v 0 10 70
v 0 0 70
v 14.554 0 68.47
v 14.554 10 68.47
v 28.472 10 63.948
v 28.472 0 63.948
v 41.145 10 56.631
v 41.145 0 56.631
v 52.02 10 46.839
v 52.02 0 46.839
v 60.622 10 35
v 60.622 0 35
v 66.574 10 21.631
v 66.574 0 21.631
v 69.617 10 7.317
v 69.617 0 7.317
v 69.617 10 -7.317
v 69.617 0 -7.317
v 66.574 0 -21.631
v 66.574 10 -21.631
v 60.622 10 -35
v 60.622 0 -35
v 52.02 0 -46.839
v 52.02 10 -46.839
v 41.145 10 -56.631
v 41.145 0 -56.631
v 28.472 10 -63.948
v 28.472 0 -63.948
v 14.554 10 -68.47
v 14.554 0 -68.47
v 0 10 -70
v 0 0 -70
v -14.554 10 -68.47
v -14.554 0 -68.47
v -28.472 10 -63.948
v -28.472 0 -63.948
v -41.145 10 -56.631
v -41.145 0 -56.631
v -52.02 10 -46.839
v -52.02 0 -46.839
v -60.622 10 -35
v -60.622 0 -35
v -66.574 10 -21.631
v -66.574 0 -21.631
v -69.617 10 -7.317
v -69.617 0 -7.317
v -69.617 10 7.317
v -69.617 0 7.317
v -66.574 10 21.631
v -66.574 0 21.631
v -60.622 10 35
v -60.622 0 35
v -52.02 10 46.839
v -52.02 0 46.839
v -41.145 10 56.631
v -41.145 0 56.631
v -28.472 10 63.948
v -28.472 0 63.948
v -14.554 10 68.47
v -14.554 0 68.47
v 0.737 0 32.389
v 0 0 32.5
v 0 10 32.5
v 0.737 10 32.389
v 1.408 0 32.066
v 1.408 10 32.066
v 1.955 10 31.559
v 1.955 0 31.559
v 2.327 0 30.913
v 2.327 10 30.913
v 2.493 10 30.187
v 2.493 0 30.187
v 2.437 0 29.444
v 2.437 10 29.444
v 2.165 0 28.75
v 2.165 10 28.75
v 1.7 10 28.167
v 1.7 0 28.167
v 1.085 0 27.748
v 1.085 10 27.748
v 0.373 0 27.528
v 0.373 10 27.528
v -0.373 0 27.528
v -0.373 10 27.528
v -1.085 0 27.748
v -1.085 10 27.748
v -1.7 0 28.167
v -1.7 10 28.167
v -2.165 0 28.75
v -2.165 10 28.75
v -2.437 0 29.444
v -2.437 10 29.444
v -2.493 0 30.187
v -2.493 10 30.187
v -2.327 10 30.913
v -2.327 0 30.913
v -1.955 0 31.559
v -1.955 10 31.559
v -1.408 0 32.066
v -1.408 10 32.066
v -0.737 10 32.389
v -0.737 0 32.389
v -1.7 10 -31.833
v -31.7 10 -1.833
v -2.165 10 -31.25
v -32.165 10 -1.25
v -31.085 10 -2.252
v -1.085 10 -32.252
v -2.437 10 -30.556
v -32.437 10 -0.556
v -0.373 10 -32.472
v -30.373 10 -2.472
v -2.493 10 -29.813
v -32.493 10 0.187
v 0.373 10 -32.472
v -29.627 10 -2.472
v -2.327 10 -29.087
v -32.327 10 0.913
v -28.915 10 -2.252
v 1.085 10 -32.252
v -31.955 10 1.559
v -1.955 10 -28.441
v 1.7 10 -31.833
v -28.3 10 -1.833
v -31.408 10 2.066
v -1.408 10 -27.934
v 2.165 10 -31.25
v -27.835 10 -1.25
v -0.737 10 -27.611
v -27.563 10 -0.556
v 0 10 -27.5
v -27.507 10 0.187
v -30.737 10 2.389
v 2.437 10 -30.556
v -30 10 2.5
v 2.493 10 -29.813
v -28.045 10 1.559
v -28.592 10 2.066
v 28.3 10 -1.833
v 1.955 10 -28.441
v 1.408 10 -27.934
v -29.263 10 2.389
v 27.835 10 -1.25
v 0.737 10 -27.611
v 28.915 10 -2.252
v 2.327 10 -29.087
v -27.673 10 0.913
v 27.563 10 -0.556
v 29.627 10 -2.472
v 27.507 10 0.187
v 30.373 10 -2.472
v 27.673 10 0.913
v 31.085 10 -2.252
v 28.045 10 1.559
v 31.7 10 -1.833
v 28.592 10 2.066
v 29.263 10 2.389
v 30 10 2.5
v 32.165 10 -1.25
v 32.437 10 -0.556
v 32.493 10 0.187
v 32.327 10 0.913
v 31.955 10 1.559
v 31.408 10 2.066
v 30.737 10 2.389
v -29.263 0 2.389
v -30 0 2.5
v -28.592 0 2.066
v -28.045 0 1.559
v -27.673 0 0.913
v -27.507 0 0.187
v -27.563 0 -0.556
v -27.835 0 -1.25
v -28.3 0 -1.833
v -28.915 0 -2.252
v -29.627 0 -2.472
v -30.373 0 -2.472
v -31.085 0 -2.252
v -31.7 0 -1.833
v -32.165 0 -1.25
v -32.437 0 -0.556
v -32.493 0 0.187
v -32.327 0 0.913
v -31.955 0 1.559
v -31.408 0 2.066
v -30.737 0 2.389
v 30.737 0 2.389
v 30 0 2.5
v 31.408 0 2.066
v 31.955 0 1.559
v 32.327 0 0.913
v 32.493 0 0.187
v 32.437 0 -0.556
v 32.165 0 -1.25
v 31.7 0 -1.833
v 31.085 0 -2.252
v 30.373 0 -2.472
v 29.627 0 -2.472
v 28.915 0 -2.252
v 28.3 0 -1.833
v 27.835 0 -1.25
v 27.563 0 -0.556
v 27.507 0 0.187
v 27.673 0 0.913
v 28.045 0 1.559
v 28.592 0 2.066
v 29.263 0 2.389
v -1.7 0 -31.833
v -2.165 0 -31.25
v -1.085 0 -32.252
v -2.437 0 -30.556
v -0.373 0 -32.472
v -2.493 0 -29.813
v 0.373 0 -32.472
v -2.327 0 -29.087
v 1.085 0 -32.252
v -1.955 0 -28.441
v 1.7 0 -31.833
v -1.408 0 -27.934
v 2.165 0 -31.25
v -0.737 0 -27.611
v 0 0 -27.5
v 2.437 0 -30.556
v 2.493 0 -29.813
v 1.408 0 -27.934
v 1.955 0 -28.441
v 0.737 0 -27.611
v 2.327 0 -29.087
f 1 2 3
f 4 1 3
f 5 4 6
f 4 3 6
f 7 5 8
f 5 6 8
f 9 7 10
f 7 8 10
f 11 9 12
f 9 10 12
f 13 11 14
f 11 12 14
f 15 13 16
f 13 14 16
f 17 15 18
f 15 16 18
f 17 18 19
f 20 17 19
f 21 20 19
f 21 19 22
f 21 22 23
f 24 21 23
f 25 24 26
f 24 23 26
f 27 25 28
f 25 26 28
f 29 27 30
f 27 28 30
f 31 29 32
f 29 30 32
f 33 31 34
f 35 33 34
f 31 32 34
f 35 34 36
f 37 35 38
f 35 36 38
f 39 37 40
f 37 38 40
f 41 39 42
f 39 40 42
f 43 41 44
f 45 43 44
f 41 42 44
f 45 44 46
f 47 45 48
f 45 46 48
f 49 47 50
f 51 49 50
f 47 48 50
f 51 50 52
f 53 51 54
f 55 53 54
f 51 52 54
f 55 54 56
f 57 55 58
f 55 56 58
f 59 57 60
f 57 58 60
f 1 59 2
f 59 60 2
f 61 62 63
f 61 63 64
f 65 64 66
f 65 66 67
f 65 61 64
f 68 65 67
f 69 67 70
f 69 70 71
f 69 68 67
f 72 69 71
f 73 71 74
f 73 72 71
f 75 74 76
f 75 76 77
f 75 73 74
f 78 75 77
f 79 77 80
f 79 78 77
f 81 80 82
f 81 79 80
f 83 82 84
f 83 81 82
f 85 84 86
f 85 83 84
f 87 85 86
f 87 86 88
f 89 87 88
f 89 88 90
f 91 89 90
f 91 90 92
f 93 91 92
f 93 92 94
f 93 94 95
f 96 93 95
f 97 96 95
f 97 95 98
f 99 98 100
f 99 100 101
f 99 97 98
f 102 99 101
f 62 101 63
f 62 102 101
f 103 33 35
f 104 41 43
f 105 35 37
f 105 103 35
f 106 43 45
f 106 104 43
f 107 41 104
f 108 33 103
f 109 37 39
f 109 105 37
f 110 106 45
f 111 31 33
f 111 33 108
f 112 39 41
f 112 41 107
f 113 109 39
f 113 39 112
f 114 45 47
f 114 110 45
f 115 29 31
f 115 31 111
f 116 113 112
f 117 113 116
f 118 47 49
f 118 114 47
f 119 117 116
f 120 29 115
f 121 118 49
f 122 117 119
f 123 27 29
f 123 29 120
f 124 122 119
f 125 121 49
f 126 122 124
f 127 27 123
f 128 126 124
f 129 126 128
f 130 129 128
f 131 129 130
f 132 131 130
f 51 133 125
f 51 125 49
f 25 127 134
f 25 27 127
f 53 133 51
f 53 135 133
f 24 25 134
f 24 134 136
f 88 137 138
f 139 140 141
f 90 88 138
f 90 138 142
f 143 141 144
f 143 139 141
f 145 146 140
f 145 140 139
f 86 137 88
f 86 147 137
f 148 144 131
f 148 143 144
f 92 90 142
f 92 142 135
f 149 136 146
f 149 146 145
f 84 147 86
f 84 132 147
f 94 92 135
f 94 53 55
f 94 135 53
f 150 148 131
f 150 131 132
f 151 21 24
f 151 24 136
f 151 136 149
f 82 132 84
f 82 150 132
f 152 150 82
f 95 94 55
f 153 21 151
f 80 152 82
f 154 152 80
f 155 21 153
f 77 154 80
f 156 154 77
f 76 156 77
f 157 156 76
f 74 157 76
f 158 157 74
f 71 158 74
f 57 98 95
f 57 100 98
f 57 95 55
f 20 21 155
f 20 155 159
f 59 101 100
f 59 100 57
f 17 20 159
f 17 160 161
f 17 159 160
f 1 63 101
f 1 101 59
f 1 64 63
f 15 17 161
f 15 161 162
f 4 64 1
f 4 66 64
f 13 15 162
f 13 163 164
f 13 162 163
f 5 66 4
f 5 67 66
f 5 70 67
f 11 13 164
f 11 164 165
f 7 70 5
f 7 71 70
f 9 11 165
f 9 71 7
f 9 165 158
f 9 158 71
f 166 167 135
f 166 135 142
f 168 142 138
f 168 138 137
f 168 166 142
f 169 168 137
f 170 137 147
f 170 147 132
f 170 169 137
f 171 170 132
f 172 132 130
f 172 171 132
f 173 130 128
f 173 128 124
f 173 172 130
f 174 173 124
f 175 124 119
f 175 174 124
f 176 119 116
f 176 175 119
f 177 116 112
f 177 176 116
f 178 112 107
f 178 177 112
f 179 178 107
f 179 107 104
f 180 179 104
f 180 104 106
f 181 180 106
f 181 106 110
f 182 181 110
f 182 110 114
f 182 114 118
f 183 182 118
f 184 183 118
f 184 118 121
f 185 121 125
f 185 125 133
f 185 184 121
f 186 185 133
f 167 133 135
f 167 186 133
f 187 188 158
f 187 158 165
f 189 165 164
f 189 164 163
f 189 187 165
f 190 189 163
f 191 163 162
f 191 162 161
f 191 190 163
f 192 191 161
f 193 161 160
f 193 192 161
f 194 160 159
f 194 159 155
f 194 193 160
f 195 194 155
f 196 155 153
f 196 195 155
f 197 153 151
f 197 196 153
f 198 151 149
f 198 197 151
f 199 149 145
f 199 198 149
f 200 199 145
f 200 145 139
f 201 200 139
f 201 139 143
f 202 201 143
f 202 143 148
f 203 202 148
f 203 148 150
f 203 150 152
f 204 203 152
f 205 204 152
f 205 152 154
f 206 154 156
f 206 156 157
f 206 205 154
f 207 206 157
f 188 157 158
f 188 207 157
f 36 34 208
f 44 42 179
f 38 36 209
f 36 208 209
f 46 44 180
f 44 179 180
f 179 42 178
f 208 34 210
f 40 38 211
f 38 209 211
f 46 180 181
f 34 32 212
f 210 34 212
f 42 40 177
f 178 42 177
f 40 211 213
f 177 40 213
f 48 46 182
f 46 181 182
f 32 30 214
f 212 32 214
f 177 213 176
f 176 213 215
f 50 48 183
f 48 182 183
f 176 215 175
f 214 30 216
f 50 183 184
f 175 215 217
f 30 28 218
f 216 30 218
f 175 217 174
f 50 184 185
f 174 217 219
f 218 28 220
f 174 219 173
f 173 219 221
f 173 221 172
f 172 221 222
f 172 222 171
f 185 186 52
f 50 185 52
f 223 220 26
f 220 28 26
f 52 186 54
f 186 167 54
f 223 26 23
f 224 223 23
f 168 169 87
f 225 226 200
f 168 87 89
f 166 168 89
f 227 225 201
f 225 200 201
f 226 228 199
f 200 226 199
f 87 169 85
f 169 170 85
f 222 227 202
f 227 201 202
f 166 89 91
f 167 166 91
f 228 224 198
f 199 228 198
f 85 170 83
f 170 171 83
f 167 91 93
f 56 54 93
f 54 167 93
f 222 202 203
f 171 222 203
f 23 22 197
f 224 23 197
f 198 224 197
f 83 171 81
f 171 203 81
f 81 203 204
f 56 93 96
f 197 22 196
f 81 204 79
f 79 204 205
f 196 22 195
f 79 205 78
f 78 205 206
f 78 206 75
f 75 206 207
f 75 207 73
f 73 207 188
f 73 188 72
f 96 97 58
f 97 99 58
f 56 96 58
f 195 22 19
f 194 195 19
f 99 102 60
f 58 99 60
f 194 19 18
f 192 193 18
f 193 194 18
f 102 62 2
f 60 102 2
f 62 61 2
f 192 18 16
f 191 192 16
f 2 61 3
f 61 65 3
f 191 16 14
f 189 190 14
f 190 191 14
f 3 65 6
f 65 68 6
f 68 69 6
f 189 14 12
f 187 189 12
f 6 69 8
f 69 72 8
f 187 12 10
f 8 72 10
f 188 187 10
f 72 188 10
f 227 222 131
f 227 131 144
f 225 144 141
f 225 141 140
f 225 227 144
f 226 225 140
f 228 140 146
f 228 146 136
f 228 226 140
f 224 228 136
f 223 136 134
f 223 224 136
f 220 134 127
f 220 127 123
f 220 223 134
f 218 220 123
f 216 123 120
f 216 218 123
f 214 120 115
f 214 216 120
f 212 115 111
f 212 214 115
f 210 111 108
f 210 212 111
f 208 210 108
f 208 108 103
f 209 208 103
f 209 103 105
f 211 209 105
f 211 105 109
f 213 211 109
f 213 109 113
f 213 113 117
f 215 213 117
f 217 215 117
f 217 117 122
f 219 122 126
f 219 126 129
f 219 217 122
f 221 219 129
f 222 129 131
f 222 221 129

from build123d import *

# Parameters (mm, degrees)
CROQUIS1_R              = 70
CROQUIS1_R_2            = 2.5
SALIENTE_EXTRUIR1_DEPTH = 10


with BuildPart() as part:
    # Croquis1 → Saliente-Extruir1 (new body)
    with BuildSketch(Plane(origin=(0, 0, 0), x_dir=(1, 0, 0), z_dir=(0, 1, 0))):
        with Locations(Location((0, 0, 0), (0, 0, 270))):
            Circle(CROQUIS1_R)
        with Locations(Location((0, 30, 0), (0, 0, 270))):
            Circle(CROQUIS1_R_2, mode=Mode.SUBTRACT)
        with Locations(Location((30, 0, 0), (0, 0, 270))):
            Circle(CROQUIS1_R_2, mode=Mode.SUBTRACT)
        with Locations(Location((0, -30, 0), (0, 0, 270))):
            Circle(CROQUIS1_R_2, mode=Mode.SUBTRACT)
        with Locations(Location((-30, 0, 0), (0, 0, 270))):
            Circle(CROQUIS1_R_2, mode=Mode.SUBTRACT)
    extrude(amount=SALIENTE_EXTRUIR1_DEPTH)


solid = part.part
